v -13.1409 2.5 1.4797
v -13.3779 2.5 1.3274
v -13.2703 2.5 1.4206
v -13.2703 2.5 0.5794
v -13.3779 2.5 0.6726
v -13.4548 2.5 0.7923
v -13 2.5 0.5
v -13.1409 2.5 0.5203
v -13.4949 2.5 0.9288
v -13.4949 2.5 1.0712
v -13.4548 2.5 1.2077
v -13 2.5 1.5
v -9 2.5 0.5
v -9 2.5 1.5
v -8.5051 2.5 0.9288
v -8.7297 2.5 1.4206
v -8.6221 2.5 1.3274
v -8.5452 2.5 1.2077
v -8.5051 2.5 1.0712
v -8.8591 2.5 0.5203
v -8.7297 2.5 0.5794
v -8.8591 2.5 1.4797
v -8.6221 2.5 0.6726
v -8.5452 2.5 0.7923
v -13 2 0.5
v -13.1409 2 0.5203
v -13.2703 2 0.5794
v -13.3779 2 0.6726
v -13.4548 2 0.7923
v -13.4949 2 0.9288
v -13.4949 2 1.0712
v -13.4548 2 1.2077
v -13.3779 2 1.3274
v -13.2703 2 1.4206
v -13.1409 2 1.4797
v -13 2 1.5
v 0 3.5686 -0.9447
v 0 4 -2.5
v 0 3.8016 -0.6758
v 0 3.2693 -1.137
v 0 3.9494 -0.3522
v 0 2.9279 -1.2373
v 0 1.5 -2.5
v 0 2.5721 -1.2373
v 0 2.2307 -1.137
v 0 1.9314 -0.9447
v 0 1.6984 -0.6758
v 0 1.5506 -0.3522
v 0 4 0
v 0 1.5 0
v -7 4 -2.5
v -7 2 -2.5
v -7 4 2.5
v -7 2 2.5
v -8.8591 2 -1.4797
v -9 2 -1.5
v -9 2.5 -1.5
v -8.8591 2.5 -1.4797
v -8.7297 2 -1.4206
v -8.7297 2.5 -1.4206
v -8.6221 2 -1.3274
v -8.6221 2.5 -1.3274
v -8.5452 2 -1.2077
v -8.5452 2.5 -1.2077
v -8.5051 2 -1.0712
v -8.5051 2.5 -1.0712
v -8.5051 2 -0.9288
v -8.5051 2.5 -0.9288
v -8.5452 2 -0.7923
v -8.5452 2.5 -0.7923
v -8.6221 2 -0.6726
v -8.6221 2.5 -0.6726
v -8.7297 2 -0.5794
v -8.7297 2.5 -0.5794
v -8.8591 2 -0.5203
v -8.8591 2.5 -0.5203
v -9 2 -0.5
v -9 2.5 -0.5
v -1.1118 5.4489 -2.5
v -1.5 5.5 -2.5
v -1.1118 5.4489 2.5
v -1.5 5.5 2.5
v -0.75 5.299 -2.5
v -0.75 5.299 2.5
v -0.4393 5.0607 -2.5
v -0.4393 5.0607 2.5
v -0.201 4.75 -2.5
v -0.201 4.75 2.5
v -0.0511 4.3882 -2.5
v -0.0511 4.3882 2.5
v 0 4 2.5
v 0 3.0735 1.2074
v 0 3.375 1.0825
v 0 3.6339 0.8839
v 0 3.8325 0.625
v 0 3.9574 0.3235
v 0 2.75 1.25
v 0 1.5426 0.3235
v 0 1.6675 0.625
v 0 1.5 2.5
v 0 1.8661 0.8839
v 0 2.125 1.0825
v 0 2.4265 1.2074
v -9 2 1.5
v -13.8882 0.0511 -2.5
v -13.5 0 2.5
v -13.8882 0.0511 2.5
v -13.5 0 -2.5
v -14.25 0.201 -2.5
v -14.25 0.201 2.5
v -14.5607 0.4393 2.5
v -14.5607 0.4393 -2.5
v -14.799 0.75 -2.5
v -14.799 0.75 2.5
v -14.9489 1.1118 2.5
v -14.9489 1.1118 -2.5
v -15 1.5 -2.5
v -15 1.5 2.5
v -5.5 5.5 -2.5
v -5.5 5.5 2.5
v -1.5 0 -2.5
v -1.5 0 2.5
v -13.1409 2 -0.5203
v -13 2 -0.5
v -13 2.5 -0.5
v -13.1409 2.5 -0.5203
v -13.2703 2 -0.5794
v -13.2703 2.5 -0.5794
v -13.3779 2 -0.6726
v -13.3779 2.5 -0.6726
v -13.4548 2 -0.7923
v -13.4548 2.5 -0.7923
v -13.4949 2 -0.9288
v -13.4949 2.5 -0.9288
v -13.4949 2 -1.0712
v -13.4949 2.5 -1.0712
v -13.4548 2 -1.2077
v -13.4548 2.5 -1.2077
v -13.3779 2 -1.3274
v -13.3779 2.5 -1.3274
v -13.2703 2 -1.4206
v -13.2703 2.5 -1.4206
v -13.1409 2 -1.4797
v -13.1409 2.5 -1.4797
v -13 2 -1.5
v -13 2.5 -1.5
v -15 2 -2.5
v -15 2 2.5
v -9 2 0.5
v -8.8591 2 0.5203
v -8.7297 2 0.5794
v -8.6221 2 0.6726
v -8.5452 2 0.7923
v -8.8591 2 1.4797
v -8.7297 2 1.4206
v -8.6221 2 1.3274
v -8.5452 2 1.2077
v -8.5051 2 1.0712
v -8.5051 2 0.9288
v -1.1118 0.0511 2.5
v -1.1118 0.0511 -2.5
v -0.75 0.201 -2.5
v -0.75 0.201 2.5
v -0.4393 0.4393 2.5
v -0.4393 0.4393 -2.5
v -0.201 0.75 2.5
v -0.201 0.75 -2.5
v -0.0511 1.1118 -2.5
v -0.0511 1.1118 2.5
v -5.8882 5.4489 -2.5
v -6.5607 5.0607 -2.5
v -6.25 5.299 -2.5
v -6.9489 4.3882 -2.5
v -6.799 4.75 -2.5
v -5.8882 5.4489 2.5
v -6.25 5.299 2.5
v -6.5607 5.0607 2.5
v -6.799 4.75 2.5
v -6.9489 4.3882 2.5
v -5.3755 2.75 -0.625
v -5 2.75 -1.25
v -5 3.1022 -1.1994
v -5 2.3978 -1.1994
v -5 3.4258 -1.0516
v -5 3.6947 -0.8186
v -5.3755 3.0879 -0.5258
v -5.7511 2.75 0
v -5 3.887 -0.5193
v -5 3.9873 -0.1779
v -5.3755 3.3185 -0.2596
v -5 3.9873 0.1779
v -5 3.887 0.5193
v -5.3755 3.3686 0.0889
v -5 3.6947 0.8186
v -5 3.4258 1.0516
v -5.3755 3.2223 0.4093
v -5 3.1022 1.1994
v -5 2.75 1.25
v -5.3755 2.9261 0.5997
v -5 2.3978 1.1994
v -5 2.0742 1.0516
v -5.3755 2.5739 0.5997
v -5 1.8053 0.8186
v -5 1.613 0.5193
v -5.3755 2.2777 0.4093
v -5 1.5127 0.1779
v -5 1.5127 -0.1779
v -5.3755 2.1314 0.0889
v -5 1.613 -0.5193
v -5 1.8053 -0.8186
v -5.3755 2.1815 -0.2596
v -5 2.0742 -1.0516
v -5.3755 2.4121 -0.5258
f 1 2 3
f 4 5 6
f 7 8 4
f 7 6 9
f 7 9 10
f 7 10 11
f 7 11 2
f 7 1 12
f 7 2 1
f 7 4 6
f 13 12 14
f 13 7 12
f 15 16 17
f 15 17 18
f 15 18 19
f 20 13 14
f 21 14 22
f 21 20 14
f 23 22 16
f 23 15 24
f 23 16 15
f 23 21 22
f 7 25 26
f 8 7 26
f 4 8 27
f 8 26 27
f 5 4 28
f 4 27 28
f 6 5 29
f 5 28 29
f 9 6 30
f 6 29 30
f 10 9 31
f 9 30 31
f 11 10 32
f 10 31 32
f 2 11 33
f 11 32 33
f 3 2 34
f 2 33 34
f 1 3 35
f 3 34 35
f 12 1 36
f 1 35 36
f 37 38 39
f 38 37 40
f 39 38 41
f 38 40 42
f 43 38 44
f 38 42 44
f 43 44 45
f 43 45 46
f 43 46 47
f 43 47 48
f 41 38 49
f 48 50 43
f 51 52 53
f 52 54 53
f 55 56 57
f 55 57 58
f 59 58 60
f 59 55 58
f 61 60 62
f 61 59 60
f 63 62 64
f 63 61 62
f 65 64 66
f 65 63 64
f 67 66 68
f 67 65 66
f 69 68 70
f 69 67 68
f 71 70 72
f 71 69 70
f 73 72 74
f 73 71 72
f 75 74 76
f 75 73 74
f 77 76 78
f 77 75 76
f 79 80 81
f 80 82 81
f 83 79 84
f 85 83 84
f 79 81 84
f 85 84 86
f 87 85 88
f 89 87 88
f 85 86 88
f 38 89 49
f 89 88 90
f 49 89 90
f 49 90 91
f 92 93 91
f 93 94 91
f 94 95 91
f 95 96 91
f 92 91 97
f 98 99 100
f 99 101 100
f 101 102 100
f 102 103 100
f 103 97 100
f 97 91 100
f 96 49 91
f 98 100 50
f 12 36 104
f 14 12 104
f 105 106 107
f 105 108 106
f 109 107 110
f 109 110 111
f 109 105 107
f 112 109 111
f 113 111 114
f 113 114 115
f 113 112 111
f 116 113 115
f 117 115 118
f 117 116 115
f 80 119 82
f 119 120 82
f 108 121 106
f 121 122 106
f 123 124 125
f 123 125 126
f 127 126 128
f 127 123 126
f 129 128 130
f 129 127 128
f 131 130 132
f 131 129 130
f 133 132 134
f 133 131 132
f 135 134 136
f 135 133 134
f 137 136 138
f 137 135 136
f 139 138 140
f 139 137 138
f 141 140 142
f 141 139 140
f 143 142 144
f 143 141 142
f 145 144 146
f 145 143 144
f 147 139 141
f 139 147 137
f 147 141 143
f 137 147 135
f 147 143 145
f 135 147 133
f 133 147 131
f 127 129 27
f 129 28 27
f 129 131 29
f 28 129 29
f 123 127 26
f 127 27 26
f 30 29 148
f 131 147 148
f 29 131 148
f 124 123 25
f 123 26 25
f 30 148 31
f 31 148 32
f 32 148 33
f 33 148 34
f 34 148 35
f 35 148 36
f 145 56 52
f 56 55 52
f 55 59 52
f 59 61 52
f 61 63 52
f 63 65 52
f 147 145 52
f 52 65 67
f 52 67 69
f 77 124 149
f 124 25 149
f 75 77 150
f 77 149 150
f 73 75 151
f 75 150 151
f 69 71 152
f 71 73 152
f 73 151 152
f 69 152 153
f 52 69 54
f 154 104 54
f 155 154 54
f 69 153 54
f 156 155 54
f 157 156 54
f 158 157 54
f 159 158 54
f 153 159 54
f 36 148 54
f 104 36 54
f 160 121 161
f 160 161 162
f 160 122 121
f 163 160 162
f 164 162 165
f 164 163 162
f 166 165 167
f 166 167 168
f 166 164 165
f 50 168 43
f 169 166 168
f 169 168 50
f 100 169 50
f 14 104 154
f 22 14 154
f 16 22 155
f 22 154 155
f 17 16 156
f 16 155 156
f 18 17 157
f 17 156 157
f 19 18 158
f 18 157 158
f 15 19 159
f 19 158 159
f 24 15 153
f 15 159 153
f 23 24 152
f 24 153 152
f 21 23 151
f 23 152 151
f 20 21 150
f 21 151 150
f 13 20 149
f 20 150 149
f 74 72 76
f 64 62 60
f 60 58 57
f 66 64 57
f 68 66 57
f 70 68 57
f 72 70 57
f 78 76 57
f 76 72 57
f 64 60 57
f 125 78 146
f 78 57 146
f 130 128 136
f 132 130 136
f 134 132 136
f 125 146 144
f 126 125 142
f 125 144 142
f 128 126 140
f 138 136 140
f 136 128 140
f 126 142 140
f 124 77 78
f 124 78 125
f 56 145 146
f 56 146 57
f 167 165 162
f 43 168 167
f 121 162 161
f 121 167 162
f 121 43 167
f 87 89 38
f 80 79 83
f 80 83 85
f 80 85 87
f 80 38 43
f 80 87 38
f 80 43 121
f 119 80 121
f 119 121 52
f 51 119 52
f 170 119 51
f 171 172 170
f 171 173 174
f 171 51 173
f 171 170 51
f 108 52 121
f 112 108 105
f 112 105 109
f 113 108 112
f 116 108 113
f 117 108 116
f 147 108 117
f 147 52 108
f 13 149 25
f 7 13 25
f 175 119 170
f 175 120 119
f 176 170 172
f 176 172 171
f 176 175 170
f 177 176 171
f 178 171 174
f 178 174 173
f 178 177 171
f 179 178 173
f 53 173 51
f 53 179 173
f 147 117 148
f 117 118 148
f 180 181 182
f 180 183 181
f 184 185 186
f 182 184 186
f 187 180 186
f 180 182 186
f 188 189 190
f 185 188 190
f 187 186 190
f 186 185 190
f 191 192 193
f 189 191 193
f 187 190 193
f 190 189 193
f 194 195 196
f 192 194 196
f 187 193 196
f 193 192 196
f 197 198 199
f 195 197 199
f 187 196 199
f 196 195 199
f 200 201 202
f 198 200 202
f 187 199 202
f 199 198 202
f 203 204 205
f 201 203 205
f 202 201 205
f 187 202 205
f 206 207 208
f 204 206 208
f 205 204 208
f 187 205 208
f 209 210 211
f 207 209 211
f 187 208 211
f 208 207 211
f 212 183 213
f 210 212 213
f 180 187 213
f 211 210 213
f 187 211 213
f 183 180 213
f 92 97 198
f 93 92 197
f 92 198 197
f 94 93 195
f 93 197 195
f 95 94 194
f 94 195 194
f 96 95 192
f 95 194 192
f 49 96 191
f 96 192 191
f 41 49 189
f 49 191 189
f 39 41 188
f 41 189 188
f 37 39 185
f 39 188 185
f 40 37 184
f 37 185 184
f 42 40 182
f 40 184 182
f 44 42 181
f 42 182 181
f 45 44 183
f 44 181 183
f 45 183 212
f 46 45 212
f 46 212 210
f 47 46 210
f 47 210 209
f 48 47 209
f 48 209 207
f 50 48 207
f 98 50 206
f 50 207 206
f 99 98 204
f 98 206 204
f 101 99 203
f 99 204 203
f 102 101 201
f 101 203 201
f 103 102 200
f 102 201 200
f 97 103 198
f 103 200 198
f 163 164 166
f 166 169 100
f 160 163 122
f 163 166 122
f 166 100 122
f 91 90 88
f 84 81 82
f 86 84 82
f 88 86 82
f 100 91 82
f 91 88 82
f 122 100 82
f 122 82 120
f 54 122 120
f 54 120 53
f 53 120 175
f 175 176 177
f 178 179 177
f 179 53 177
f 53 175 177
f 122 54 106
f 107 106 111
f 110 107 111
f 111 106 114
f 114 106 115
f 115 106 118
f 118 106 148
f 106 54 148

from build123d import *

# Parameters (mm, degrees)
EXTRUDE_1_DEPTH        = 2.5
FILLET_1_R             = 1.5
HOLE_WIZARD_M3_1_D     = 2.5
HOLE_WIZARD_M3_1_DEPTH = 5
HOLE_WIZARD_M3_1_TIP   = 0.751075774
EXTRUDE_2_DEPTH        = 0.5


with BuildPart() as part:
    # 스케치1 → 보스-돌출1 (new body, symmetric)
    with BuildSketch(Plane.XY):
        Polygon((0, 0), (-15, 0), (-15, 2), (-7, 2), (-7, 5.5), (0, 5.5), align=None)
    extrude(amount=EXTRUDE_1_DEPTH, both=True)

    # 필렛1
    fillet_1_edges = [part.edges().sort_by_distance(p)[0] for p in [
        (0, 0, 0),
        (-15, 0, 0),
        (-7, 5.5, 0),
        (0, 5.5, 0),
    ]]
    fillet(fillet_1_edges, radius=FILLET_1_R)

    # M3 나사 구멍1
    with Locations(Plane(origin=(0, 0, 0), x_dir=(0, 0, -1), z_dir=(1, 0, 0))):
        with Locations((0, 2.75)):
            Hole(HOLE_WIZARD_M3_1_D / 2, depth=HOLE_WIZARD_M3_1_DEPTH)
            with Locations((0, 0, -(HOLE_WIZARD_M3_1_DEPTH + HOLE_WIZARD_M3_1_TIP / 2))):  # 118° drill point
                Cone(0, HOLE_WIZARD_M3_1_D / 2, HOLE_WIZARD_M3_1_TIP, mode=Mode.SUBTRACT)

    # 스케치4 → 보스-돌출2 (add)
    with BuildSketch(Plane(origin=(0, 2, 0), x_dir=(1, 0, 0), z_dir=(0, 1, 0))):
        with BuildLine():
            Line((-13, 1.5), (-9, 1.5))
            ThreePointArc((-9, 1.5), (-8.5, 1), (-9, 0.5))
            Line((-9, 0.5), (-13, 0.5))
            ThreePointArc((-13, 0.5), (-13.5, 1), (-13, 1.5))
        make_face()
        with BuildLine():
            Line((-13, -1.5), (-9, -1.5))
            ThreePointArc((-9, -1.5), (-8.5, -1), (-9, -0.5))
            Line((-9, -0.5), (-13, -0.5))
            ThreePointArc((-13, -0.5), (-13.5, -1), (-13, -1.5))
        make_face()
    extrude(amount=EXTRUDE_2_DEPTH)


solid = part.part
